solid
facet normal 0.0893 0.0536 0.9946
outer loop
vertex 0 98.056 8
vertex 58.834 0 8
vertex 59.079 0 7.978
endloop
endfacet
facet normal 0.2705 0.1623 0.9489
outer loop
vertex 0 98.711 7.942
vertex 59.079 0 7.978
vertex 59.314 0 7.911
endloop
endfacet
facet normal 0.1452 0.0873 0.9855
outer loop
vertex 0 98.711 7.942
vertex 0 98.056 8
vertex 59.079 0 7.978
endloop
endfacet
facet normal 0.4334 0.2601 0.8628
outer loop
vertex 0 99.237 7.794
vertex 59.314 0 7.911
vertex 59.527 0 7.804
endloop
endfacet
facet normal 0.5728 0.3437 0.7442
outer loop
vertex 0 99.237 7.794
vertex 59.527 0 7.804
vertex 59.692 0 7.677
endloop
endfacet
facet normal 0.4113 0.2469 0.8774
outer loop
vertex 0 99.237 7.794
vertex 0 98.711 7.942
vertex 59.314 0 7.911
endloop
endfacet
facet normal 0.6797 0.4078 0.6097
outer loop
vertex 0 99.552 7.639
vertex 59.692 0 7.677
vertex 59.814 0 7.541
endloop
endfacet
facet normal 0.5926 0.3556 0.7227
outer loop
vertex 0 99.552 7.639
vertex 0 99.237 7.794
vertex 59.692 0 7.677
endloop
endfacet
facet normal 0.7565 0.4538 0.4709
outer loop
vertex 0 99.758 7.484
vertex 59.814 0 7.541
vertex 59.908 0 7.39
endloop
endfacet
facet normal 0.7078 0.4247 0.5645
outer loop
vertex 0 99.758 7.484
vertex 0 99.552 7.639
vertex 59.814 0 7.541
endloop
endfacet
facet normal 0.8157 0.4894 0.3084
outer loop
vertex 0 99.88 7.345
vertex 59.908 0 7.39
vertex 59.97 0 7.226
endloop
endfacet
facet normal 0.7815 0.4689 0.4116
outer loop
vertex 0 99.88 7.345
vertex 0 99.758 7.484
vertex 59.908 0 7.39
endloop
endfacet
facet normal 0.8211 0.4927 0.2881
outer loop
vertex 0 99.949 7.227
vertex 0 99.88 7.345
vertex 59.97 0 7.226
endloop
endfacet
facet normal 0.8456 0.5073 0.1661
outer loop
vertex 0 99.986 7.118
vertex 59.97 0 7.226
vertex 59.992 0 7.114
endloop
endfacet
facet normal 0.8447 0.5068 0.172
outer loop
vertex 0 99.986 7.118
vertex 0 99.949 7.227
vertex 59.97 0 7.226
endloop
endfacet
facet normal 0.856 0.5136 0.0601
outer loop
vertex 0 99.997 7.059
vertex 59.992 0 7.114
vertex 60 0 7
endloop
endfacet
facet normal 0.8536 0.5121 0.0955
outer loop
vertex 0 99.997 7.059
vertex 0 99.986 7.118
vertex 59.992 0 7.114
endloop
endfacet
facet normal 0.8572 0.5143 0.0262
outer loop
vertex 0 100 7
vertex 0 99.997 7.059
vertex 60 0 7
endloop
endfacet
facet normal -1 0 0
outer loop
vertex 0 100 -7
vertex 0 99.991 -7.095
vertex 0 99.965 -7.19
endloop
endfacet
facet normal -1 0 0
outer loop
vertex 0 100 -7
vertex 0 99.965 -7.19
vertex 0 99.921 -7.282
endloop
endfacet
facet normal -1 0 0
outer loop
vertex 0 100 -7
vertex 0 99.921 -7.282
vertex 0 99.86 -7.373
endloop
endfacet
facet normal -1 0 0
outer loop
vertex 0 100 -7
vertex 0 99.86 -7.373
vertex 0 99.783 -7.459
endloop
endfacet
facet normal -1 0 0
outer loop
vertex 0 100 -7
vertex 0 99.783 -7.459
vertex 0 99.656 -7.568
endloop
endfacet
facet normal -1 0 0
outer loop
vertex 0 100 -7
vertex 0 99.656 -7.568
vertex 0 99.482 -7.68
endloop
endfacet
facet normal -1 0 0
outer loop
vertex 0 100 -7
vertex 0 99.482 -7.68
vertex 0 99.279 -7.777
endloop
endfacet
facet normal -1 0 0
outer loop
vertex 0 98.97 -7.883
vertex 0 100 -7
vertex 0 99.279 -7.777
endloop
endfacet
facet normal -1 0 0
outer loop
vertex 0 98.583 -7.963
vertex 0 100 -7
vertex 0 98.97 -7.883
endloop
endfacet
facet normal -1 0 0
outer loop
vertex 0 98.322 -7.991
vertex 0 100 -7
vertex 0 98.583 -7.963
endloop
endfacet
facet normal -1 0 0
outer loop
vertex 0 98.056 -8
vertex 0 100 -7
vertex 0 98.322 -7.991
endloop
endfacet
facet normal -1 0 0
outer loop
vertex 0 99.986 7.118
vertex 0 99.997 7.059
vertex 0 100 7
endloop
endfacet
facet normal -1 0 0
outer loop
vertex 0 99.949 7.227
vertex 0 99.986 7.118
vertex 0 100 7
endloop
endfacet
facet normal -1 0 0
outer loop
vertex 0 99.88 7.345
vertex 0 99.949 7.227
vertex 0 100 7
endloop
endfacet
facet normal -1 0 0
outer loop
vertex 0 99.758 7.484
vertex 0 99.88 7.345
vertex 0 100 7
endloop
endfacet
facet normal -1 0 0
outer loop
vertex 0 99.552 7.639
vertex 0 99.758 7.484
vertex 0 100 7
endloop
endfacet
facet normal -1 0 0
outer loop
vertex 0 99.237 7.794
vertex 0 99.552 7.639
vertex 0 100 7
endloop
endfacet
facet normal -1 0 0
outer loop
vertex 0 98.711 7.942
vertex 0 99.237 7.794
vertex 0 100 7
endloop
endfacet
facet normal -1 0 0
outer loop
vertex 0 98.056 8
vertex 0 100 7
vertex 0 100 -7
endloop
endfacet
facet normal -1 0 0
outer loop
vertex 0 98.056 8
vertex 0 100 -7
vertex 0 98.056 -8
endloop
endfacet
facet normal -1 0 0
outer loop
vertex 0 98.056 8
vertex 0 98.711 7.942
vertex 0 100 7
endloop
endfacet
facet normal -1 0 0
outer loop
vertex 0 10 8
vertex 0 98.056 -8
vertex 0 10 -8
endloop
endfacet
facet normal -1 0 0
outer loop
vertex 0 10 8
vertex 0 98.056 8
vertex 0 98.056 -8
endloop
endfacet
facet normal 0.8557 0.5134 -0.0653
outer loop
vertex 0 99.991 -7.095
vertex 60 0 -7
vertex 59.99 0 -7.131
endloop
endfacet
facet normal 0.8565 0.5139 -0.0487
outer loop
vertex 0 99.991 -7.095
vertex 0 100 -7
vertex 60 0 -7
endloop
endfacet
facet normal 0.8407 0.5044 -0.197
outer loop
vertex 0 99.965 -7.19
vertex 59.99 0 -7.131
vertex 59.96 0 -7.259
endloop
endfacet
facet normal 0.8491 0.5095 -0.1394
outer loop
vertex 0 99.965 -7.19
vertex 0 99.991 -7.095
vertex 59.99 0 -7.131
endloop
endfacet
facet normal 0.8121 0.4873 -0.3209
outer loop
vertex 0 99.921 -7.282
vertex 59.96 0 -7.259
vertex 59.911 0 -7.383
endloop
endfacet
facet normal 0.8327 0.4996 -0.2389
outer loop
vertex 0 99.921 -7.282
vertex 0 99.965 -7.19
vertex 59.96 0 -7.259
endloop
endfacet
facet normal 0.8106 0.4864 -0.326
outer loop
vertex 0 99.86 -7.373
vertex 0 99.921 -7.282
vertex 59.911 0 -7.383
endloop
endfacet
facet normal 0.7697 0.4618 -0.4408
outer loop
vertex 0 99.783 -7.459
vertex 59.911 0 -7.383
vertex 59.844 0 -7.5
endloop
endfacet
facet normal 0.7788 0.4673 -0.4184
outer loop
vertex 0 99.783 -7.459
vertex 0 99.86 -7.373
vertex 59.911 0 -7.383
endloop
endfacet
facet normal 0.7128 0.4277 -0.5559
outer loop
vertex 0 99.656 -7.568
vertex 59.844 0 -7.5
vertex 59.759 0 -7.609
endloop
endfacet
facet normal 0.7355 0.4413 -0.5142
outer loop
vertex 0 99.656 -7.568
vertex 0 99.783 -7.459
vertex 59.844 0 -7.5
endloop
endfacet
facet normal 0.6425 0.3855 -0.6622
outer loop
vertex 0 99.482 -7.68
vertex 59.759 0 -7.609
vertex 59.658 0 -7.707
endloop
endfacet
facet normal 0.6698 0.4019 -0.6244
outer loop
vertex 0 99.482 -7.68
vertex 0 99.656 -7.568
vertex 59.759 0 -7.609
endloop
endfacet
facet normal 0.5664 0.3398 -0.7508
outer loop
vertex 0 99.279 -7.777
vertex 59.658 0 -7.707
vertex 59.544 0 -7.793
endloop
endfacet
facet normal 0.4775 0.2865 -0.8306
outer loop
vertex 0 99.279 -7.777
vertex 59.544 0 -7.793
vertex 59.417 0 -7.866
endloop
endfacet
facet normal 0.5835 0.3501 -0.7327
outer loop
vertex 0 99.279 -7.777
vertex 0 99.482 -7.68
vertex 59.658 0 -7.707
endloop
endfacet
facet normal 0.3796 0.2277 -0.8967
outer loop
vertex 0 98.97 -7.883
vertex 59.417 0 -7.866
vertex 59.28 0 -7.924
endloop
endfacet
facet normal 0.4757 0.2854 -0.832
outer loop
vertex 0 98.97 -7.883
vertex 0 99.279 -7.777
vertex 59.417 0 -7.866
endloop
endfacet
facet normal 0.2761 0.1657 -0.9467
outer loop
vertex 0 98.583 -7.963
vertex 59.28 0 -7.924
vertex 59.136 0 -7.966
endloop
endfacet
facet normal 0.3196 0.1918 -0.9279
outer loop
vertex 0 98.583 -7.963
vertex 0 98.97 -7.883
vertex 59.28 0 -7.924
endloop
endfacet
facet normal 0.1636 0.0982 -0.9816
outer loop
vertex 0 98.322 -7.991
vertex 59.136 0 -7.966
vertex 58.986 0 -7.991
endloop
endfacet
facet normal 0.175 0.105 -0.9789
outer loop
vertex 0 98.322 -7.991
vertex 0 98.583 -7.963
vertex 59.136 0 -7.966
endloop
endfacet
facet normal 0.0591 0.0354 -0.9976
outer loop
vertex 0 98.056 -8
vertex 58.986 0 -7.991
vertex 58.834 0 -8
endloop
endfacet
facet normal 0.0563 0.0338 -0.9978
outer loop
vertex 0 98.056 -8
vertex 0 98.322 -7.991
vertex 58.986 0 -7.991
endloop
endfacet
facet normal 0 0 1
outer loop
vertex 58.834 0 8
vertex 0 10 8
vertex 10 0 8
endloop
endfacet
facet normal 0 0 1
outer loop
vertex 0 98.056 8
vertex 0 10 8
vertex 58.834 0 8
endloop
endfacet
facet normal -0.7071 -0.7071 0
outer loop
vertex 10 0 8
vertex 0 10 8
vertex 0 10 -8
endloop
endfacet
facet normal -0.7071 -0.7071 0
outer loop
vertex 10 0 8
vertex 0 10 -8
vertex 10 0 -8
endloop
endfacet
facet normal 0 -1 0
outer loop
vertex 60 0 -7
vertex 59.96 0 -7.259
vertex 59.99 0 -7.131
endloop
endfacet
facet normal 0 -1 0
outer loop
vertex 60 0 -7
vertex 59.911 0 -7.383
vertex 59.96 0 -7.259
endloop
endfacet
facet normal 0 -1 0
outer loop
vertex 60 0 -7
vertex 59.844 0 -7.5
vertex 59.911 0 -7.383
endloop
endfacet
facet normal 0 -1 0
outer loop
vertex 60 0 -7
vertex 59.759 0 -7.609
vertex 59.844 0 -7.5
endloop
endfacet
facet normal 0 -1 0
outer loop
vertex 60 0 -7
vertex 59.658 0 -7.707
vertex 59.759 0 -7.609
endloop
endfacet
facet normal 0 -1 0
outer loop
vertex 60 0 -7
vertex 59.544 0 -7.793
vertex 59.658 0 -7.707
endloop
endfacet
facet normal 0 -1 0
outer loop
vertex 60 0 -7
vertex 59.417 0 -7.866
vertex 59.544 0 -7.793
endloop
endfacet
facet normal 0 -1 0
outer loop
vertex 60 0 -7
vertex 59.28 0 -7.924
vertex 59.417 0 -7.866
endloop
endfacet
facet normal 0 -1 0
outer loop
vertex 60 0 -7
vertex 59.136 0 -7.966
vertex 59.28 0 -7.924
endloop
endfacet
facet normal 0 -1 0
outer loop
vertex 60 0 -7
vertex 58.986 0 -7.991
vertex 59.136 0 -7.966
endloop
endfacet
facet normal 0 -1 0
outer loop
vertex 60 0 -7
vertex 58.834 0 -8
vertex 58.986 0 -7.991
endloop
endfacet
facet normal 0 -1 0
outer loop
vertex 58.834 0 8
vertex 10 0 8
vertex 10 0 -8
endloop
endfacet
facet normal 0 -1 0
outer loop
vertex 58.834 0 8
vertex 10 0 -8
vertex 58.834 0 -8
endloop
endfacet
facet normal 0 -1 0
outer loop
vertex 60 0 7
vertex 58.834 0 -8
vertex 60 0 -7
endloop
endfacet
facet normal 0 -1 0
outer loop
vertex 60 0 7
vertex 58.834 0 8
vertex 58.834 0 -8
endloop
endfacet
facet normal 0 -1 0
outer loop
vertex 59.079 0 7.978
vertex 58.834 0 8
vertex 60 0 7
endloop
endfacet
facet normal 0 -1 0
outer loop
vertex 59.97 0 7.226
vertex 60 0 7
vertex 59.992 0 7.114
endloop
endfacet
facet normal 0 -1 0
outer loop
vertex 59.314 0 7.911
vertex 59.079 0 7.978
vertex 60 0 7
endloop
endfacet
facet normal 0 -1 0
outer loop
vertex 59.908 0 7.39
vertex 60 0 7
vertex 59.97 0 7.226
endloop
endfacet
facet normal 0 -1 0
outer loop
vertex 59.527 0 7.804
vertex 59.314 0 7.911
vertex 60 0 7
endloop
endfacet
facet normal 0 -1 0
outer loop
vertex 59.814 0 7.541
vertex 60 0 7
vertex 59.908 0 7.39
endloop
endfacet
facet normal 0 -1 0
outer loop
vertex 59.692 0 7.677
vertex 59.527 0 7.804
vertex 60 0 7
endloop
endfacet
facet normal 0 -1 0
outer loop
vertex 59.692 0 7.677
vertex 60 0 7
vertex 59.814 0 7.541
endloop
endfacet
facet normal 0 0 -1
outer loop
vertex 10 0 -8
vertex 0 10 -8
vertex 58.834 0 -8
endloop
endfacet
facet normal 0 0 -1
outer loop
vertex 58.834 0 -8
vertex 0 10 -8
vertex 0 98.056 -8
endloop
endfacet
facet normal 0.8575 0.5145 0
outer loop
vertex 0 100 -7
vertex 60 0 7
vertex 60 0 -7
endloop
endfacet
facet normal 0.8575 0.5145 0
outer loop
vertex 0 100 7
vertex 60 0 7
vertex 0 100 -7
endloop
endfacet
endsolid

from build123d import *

# Parameters (mm, degrees)
BOSS_EXTRUDE1_DEPTH = 8
CUT_EXTRUDE1_DEPTH  = 17
FILLET1_R           = 1


with BuildPart() as part:
    # Sketch1 → Boss-Extrude1 (new body, symmetric)
    with BuildSketch(Plane.XY):
        Polygon((0, 0), (60, 0), (0, 100), align=None)
    extrude(amount=BOSS_EXTRUDE1_DEPTH, both=True)

    # Sketch2 → Cut-Extrude1 (cut, through all)
    with BuildSketch(Plane.XY.offset(8)):
        Polygon((0, 0), (0, 10), (10, 0), align=None)
    extrude(amount=-CUT_EXTRUDE1_DEPTH, mode=Mode.SUBTRACT)

    # Fillet1
    fillet1_edges = [part.edges().sort_by_distance(p)[0] for p in [
        (30, 50, 8),
        (30, 50, -8),
    ]]
    fillet(fillet1_edges, radius=FILLET1_R)


solid = part.part
